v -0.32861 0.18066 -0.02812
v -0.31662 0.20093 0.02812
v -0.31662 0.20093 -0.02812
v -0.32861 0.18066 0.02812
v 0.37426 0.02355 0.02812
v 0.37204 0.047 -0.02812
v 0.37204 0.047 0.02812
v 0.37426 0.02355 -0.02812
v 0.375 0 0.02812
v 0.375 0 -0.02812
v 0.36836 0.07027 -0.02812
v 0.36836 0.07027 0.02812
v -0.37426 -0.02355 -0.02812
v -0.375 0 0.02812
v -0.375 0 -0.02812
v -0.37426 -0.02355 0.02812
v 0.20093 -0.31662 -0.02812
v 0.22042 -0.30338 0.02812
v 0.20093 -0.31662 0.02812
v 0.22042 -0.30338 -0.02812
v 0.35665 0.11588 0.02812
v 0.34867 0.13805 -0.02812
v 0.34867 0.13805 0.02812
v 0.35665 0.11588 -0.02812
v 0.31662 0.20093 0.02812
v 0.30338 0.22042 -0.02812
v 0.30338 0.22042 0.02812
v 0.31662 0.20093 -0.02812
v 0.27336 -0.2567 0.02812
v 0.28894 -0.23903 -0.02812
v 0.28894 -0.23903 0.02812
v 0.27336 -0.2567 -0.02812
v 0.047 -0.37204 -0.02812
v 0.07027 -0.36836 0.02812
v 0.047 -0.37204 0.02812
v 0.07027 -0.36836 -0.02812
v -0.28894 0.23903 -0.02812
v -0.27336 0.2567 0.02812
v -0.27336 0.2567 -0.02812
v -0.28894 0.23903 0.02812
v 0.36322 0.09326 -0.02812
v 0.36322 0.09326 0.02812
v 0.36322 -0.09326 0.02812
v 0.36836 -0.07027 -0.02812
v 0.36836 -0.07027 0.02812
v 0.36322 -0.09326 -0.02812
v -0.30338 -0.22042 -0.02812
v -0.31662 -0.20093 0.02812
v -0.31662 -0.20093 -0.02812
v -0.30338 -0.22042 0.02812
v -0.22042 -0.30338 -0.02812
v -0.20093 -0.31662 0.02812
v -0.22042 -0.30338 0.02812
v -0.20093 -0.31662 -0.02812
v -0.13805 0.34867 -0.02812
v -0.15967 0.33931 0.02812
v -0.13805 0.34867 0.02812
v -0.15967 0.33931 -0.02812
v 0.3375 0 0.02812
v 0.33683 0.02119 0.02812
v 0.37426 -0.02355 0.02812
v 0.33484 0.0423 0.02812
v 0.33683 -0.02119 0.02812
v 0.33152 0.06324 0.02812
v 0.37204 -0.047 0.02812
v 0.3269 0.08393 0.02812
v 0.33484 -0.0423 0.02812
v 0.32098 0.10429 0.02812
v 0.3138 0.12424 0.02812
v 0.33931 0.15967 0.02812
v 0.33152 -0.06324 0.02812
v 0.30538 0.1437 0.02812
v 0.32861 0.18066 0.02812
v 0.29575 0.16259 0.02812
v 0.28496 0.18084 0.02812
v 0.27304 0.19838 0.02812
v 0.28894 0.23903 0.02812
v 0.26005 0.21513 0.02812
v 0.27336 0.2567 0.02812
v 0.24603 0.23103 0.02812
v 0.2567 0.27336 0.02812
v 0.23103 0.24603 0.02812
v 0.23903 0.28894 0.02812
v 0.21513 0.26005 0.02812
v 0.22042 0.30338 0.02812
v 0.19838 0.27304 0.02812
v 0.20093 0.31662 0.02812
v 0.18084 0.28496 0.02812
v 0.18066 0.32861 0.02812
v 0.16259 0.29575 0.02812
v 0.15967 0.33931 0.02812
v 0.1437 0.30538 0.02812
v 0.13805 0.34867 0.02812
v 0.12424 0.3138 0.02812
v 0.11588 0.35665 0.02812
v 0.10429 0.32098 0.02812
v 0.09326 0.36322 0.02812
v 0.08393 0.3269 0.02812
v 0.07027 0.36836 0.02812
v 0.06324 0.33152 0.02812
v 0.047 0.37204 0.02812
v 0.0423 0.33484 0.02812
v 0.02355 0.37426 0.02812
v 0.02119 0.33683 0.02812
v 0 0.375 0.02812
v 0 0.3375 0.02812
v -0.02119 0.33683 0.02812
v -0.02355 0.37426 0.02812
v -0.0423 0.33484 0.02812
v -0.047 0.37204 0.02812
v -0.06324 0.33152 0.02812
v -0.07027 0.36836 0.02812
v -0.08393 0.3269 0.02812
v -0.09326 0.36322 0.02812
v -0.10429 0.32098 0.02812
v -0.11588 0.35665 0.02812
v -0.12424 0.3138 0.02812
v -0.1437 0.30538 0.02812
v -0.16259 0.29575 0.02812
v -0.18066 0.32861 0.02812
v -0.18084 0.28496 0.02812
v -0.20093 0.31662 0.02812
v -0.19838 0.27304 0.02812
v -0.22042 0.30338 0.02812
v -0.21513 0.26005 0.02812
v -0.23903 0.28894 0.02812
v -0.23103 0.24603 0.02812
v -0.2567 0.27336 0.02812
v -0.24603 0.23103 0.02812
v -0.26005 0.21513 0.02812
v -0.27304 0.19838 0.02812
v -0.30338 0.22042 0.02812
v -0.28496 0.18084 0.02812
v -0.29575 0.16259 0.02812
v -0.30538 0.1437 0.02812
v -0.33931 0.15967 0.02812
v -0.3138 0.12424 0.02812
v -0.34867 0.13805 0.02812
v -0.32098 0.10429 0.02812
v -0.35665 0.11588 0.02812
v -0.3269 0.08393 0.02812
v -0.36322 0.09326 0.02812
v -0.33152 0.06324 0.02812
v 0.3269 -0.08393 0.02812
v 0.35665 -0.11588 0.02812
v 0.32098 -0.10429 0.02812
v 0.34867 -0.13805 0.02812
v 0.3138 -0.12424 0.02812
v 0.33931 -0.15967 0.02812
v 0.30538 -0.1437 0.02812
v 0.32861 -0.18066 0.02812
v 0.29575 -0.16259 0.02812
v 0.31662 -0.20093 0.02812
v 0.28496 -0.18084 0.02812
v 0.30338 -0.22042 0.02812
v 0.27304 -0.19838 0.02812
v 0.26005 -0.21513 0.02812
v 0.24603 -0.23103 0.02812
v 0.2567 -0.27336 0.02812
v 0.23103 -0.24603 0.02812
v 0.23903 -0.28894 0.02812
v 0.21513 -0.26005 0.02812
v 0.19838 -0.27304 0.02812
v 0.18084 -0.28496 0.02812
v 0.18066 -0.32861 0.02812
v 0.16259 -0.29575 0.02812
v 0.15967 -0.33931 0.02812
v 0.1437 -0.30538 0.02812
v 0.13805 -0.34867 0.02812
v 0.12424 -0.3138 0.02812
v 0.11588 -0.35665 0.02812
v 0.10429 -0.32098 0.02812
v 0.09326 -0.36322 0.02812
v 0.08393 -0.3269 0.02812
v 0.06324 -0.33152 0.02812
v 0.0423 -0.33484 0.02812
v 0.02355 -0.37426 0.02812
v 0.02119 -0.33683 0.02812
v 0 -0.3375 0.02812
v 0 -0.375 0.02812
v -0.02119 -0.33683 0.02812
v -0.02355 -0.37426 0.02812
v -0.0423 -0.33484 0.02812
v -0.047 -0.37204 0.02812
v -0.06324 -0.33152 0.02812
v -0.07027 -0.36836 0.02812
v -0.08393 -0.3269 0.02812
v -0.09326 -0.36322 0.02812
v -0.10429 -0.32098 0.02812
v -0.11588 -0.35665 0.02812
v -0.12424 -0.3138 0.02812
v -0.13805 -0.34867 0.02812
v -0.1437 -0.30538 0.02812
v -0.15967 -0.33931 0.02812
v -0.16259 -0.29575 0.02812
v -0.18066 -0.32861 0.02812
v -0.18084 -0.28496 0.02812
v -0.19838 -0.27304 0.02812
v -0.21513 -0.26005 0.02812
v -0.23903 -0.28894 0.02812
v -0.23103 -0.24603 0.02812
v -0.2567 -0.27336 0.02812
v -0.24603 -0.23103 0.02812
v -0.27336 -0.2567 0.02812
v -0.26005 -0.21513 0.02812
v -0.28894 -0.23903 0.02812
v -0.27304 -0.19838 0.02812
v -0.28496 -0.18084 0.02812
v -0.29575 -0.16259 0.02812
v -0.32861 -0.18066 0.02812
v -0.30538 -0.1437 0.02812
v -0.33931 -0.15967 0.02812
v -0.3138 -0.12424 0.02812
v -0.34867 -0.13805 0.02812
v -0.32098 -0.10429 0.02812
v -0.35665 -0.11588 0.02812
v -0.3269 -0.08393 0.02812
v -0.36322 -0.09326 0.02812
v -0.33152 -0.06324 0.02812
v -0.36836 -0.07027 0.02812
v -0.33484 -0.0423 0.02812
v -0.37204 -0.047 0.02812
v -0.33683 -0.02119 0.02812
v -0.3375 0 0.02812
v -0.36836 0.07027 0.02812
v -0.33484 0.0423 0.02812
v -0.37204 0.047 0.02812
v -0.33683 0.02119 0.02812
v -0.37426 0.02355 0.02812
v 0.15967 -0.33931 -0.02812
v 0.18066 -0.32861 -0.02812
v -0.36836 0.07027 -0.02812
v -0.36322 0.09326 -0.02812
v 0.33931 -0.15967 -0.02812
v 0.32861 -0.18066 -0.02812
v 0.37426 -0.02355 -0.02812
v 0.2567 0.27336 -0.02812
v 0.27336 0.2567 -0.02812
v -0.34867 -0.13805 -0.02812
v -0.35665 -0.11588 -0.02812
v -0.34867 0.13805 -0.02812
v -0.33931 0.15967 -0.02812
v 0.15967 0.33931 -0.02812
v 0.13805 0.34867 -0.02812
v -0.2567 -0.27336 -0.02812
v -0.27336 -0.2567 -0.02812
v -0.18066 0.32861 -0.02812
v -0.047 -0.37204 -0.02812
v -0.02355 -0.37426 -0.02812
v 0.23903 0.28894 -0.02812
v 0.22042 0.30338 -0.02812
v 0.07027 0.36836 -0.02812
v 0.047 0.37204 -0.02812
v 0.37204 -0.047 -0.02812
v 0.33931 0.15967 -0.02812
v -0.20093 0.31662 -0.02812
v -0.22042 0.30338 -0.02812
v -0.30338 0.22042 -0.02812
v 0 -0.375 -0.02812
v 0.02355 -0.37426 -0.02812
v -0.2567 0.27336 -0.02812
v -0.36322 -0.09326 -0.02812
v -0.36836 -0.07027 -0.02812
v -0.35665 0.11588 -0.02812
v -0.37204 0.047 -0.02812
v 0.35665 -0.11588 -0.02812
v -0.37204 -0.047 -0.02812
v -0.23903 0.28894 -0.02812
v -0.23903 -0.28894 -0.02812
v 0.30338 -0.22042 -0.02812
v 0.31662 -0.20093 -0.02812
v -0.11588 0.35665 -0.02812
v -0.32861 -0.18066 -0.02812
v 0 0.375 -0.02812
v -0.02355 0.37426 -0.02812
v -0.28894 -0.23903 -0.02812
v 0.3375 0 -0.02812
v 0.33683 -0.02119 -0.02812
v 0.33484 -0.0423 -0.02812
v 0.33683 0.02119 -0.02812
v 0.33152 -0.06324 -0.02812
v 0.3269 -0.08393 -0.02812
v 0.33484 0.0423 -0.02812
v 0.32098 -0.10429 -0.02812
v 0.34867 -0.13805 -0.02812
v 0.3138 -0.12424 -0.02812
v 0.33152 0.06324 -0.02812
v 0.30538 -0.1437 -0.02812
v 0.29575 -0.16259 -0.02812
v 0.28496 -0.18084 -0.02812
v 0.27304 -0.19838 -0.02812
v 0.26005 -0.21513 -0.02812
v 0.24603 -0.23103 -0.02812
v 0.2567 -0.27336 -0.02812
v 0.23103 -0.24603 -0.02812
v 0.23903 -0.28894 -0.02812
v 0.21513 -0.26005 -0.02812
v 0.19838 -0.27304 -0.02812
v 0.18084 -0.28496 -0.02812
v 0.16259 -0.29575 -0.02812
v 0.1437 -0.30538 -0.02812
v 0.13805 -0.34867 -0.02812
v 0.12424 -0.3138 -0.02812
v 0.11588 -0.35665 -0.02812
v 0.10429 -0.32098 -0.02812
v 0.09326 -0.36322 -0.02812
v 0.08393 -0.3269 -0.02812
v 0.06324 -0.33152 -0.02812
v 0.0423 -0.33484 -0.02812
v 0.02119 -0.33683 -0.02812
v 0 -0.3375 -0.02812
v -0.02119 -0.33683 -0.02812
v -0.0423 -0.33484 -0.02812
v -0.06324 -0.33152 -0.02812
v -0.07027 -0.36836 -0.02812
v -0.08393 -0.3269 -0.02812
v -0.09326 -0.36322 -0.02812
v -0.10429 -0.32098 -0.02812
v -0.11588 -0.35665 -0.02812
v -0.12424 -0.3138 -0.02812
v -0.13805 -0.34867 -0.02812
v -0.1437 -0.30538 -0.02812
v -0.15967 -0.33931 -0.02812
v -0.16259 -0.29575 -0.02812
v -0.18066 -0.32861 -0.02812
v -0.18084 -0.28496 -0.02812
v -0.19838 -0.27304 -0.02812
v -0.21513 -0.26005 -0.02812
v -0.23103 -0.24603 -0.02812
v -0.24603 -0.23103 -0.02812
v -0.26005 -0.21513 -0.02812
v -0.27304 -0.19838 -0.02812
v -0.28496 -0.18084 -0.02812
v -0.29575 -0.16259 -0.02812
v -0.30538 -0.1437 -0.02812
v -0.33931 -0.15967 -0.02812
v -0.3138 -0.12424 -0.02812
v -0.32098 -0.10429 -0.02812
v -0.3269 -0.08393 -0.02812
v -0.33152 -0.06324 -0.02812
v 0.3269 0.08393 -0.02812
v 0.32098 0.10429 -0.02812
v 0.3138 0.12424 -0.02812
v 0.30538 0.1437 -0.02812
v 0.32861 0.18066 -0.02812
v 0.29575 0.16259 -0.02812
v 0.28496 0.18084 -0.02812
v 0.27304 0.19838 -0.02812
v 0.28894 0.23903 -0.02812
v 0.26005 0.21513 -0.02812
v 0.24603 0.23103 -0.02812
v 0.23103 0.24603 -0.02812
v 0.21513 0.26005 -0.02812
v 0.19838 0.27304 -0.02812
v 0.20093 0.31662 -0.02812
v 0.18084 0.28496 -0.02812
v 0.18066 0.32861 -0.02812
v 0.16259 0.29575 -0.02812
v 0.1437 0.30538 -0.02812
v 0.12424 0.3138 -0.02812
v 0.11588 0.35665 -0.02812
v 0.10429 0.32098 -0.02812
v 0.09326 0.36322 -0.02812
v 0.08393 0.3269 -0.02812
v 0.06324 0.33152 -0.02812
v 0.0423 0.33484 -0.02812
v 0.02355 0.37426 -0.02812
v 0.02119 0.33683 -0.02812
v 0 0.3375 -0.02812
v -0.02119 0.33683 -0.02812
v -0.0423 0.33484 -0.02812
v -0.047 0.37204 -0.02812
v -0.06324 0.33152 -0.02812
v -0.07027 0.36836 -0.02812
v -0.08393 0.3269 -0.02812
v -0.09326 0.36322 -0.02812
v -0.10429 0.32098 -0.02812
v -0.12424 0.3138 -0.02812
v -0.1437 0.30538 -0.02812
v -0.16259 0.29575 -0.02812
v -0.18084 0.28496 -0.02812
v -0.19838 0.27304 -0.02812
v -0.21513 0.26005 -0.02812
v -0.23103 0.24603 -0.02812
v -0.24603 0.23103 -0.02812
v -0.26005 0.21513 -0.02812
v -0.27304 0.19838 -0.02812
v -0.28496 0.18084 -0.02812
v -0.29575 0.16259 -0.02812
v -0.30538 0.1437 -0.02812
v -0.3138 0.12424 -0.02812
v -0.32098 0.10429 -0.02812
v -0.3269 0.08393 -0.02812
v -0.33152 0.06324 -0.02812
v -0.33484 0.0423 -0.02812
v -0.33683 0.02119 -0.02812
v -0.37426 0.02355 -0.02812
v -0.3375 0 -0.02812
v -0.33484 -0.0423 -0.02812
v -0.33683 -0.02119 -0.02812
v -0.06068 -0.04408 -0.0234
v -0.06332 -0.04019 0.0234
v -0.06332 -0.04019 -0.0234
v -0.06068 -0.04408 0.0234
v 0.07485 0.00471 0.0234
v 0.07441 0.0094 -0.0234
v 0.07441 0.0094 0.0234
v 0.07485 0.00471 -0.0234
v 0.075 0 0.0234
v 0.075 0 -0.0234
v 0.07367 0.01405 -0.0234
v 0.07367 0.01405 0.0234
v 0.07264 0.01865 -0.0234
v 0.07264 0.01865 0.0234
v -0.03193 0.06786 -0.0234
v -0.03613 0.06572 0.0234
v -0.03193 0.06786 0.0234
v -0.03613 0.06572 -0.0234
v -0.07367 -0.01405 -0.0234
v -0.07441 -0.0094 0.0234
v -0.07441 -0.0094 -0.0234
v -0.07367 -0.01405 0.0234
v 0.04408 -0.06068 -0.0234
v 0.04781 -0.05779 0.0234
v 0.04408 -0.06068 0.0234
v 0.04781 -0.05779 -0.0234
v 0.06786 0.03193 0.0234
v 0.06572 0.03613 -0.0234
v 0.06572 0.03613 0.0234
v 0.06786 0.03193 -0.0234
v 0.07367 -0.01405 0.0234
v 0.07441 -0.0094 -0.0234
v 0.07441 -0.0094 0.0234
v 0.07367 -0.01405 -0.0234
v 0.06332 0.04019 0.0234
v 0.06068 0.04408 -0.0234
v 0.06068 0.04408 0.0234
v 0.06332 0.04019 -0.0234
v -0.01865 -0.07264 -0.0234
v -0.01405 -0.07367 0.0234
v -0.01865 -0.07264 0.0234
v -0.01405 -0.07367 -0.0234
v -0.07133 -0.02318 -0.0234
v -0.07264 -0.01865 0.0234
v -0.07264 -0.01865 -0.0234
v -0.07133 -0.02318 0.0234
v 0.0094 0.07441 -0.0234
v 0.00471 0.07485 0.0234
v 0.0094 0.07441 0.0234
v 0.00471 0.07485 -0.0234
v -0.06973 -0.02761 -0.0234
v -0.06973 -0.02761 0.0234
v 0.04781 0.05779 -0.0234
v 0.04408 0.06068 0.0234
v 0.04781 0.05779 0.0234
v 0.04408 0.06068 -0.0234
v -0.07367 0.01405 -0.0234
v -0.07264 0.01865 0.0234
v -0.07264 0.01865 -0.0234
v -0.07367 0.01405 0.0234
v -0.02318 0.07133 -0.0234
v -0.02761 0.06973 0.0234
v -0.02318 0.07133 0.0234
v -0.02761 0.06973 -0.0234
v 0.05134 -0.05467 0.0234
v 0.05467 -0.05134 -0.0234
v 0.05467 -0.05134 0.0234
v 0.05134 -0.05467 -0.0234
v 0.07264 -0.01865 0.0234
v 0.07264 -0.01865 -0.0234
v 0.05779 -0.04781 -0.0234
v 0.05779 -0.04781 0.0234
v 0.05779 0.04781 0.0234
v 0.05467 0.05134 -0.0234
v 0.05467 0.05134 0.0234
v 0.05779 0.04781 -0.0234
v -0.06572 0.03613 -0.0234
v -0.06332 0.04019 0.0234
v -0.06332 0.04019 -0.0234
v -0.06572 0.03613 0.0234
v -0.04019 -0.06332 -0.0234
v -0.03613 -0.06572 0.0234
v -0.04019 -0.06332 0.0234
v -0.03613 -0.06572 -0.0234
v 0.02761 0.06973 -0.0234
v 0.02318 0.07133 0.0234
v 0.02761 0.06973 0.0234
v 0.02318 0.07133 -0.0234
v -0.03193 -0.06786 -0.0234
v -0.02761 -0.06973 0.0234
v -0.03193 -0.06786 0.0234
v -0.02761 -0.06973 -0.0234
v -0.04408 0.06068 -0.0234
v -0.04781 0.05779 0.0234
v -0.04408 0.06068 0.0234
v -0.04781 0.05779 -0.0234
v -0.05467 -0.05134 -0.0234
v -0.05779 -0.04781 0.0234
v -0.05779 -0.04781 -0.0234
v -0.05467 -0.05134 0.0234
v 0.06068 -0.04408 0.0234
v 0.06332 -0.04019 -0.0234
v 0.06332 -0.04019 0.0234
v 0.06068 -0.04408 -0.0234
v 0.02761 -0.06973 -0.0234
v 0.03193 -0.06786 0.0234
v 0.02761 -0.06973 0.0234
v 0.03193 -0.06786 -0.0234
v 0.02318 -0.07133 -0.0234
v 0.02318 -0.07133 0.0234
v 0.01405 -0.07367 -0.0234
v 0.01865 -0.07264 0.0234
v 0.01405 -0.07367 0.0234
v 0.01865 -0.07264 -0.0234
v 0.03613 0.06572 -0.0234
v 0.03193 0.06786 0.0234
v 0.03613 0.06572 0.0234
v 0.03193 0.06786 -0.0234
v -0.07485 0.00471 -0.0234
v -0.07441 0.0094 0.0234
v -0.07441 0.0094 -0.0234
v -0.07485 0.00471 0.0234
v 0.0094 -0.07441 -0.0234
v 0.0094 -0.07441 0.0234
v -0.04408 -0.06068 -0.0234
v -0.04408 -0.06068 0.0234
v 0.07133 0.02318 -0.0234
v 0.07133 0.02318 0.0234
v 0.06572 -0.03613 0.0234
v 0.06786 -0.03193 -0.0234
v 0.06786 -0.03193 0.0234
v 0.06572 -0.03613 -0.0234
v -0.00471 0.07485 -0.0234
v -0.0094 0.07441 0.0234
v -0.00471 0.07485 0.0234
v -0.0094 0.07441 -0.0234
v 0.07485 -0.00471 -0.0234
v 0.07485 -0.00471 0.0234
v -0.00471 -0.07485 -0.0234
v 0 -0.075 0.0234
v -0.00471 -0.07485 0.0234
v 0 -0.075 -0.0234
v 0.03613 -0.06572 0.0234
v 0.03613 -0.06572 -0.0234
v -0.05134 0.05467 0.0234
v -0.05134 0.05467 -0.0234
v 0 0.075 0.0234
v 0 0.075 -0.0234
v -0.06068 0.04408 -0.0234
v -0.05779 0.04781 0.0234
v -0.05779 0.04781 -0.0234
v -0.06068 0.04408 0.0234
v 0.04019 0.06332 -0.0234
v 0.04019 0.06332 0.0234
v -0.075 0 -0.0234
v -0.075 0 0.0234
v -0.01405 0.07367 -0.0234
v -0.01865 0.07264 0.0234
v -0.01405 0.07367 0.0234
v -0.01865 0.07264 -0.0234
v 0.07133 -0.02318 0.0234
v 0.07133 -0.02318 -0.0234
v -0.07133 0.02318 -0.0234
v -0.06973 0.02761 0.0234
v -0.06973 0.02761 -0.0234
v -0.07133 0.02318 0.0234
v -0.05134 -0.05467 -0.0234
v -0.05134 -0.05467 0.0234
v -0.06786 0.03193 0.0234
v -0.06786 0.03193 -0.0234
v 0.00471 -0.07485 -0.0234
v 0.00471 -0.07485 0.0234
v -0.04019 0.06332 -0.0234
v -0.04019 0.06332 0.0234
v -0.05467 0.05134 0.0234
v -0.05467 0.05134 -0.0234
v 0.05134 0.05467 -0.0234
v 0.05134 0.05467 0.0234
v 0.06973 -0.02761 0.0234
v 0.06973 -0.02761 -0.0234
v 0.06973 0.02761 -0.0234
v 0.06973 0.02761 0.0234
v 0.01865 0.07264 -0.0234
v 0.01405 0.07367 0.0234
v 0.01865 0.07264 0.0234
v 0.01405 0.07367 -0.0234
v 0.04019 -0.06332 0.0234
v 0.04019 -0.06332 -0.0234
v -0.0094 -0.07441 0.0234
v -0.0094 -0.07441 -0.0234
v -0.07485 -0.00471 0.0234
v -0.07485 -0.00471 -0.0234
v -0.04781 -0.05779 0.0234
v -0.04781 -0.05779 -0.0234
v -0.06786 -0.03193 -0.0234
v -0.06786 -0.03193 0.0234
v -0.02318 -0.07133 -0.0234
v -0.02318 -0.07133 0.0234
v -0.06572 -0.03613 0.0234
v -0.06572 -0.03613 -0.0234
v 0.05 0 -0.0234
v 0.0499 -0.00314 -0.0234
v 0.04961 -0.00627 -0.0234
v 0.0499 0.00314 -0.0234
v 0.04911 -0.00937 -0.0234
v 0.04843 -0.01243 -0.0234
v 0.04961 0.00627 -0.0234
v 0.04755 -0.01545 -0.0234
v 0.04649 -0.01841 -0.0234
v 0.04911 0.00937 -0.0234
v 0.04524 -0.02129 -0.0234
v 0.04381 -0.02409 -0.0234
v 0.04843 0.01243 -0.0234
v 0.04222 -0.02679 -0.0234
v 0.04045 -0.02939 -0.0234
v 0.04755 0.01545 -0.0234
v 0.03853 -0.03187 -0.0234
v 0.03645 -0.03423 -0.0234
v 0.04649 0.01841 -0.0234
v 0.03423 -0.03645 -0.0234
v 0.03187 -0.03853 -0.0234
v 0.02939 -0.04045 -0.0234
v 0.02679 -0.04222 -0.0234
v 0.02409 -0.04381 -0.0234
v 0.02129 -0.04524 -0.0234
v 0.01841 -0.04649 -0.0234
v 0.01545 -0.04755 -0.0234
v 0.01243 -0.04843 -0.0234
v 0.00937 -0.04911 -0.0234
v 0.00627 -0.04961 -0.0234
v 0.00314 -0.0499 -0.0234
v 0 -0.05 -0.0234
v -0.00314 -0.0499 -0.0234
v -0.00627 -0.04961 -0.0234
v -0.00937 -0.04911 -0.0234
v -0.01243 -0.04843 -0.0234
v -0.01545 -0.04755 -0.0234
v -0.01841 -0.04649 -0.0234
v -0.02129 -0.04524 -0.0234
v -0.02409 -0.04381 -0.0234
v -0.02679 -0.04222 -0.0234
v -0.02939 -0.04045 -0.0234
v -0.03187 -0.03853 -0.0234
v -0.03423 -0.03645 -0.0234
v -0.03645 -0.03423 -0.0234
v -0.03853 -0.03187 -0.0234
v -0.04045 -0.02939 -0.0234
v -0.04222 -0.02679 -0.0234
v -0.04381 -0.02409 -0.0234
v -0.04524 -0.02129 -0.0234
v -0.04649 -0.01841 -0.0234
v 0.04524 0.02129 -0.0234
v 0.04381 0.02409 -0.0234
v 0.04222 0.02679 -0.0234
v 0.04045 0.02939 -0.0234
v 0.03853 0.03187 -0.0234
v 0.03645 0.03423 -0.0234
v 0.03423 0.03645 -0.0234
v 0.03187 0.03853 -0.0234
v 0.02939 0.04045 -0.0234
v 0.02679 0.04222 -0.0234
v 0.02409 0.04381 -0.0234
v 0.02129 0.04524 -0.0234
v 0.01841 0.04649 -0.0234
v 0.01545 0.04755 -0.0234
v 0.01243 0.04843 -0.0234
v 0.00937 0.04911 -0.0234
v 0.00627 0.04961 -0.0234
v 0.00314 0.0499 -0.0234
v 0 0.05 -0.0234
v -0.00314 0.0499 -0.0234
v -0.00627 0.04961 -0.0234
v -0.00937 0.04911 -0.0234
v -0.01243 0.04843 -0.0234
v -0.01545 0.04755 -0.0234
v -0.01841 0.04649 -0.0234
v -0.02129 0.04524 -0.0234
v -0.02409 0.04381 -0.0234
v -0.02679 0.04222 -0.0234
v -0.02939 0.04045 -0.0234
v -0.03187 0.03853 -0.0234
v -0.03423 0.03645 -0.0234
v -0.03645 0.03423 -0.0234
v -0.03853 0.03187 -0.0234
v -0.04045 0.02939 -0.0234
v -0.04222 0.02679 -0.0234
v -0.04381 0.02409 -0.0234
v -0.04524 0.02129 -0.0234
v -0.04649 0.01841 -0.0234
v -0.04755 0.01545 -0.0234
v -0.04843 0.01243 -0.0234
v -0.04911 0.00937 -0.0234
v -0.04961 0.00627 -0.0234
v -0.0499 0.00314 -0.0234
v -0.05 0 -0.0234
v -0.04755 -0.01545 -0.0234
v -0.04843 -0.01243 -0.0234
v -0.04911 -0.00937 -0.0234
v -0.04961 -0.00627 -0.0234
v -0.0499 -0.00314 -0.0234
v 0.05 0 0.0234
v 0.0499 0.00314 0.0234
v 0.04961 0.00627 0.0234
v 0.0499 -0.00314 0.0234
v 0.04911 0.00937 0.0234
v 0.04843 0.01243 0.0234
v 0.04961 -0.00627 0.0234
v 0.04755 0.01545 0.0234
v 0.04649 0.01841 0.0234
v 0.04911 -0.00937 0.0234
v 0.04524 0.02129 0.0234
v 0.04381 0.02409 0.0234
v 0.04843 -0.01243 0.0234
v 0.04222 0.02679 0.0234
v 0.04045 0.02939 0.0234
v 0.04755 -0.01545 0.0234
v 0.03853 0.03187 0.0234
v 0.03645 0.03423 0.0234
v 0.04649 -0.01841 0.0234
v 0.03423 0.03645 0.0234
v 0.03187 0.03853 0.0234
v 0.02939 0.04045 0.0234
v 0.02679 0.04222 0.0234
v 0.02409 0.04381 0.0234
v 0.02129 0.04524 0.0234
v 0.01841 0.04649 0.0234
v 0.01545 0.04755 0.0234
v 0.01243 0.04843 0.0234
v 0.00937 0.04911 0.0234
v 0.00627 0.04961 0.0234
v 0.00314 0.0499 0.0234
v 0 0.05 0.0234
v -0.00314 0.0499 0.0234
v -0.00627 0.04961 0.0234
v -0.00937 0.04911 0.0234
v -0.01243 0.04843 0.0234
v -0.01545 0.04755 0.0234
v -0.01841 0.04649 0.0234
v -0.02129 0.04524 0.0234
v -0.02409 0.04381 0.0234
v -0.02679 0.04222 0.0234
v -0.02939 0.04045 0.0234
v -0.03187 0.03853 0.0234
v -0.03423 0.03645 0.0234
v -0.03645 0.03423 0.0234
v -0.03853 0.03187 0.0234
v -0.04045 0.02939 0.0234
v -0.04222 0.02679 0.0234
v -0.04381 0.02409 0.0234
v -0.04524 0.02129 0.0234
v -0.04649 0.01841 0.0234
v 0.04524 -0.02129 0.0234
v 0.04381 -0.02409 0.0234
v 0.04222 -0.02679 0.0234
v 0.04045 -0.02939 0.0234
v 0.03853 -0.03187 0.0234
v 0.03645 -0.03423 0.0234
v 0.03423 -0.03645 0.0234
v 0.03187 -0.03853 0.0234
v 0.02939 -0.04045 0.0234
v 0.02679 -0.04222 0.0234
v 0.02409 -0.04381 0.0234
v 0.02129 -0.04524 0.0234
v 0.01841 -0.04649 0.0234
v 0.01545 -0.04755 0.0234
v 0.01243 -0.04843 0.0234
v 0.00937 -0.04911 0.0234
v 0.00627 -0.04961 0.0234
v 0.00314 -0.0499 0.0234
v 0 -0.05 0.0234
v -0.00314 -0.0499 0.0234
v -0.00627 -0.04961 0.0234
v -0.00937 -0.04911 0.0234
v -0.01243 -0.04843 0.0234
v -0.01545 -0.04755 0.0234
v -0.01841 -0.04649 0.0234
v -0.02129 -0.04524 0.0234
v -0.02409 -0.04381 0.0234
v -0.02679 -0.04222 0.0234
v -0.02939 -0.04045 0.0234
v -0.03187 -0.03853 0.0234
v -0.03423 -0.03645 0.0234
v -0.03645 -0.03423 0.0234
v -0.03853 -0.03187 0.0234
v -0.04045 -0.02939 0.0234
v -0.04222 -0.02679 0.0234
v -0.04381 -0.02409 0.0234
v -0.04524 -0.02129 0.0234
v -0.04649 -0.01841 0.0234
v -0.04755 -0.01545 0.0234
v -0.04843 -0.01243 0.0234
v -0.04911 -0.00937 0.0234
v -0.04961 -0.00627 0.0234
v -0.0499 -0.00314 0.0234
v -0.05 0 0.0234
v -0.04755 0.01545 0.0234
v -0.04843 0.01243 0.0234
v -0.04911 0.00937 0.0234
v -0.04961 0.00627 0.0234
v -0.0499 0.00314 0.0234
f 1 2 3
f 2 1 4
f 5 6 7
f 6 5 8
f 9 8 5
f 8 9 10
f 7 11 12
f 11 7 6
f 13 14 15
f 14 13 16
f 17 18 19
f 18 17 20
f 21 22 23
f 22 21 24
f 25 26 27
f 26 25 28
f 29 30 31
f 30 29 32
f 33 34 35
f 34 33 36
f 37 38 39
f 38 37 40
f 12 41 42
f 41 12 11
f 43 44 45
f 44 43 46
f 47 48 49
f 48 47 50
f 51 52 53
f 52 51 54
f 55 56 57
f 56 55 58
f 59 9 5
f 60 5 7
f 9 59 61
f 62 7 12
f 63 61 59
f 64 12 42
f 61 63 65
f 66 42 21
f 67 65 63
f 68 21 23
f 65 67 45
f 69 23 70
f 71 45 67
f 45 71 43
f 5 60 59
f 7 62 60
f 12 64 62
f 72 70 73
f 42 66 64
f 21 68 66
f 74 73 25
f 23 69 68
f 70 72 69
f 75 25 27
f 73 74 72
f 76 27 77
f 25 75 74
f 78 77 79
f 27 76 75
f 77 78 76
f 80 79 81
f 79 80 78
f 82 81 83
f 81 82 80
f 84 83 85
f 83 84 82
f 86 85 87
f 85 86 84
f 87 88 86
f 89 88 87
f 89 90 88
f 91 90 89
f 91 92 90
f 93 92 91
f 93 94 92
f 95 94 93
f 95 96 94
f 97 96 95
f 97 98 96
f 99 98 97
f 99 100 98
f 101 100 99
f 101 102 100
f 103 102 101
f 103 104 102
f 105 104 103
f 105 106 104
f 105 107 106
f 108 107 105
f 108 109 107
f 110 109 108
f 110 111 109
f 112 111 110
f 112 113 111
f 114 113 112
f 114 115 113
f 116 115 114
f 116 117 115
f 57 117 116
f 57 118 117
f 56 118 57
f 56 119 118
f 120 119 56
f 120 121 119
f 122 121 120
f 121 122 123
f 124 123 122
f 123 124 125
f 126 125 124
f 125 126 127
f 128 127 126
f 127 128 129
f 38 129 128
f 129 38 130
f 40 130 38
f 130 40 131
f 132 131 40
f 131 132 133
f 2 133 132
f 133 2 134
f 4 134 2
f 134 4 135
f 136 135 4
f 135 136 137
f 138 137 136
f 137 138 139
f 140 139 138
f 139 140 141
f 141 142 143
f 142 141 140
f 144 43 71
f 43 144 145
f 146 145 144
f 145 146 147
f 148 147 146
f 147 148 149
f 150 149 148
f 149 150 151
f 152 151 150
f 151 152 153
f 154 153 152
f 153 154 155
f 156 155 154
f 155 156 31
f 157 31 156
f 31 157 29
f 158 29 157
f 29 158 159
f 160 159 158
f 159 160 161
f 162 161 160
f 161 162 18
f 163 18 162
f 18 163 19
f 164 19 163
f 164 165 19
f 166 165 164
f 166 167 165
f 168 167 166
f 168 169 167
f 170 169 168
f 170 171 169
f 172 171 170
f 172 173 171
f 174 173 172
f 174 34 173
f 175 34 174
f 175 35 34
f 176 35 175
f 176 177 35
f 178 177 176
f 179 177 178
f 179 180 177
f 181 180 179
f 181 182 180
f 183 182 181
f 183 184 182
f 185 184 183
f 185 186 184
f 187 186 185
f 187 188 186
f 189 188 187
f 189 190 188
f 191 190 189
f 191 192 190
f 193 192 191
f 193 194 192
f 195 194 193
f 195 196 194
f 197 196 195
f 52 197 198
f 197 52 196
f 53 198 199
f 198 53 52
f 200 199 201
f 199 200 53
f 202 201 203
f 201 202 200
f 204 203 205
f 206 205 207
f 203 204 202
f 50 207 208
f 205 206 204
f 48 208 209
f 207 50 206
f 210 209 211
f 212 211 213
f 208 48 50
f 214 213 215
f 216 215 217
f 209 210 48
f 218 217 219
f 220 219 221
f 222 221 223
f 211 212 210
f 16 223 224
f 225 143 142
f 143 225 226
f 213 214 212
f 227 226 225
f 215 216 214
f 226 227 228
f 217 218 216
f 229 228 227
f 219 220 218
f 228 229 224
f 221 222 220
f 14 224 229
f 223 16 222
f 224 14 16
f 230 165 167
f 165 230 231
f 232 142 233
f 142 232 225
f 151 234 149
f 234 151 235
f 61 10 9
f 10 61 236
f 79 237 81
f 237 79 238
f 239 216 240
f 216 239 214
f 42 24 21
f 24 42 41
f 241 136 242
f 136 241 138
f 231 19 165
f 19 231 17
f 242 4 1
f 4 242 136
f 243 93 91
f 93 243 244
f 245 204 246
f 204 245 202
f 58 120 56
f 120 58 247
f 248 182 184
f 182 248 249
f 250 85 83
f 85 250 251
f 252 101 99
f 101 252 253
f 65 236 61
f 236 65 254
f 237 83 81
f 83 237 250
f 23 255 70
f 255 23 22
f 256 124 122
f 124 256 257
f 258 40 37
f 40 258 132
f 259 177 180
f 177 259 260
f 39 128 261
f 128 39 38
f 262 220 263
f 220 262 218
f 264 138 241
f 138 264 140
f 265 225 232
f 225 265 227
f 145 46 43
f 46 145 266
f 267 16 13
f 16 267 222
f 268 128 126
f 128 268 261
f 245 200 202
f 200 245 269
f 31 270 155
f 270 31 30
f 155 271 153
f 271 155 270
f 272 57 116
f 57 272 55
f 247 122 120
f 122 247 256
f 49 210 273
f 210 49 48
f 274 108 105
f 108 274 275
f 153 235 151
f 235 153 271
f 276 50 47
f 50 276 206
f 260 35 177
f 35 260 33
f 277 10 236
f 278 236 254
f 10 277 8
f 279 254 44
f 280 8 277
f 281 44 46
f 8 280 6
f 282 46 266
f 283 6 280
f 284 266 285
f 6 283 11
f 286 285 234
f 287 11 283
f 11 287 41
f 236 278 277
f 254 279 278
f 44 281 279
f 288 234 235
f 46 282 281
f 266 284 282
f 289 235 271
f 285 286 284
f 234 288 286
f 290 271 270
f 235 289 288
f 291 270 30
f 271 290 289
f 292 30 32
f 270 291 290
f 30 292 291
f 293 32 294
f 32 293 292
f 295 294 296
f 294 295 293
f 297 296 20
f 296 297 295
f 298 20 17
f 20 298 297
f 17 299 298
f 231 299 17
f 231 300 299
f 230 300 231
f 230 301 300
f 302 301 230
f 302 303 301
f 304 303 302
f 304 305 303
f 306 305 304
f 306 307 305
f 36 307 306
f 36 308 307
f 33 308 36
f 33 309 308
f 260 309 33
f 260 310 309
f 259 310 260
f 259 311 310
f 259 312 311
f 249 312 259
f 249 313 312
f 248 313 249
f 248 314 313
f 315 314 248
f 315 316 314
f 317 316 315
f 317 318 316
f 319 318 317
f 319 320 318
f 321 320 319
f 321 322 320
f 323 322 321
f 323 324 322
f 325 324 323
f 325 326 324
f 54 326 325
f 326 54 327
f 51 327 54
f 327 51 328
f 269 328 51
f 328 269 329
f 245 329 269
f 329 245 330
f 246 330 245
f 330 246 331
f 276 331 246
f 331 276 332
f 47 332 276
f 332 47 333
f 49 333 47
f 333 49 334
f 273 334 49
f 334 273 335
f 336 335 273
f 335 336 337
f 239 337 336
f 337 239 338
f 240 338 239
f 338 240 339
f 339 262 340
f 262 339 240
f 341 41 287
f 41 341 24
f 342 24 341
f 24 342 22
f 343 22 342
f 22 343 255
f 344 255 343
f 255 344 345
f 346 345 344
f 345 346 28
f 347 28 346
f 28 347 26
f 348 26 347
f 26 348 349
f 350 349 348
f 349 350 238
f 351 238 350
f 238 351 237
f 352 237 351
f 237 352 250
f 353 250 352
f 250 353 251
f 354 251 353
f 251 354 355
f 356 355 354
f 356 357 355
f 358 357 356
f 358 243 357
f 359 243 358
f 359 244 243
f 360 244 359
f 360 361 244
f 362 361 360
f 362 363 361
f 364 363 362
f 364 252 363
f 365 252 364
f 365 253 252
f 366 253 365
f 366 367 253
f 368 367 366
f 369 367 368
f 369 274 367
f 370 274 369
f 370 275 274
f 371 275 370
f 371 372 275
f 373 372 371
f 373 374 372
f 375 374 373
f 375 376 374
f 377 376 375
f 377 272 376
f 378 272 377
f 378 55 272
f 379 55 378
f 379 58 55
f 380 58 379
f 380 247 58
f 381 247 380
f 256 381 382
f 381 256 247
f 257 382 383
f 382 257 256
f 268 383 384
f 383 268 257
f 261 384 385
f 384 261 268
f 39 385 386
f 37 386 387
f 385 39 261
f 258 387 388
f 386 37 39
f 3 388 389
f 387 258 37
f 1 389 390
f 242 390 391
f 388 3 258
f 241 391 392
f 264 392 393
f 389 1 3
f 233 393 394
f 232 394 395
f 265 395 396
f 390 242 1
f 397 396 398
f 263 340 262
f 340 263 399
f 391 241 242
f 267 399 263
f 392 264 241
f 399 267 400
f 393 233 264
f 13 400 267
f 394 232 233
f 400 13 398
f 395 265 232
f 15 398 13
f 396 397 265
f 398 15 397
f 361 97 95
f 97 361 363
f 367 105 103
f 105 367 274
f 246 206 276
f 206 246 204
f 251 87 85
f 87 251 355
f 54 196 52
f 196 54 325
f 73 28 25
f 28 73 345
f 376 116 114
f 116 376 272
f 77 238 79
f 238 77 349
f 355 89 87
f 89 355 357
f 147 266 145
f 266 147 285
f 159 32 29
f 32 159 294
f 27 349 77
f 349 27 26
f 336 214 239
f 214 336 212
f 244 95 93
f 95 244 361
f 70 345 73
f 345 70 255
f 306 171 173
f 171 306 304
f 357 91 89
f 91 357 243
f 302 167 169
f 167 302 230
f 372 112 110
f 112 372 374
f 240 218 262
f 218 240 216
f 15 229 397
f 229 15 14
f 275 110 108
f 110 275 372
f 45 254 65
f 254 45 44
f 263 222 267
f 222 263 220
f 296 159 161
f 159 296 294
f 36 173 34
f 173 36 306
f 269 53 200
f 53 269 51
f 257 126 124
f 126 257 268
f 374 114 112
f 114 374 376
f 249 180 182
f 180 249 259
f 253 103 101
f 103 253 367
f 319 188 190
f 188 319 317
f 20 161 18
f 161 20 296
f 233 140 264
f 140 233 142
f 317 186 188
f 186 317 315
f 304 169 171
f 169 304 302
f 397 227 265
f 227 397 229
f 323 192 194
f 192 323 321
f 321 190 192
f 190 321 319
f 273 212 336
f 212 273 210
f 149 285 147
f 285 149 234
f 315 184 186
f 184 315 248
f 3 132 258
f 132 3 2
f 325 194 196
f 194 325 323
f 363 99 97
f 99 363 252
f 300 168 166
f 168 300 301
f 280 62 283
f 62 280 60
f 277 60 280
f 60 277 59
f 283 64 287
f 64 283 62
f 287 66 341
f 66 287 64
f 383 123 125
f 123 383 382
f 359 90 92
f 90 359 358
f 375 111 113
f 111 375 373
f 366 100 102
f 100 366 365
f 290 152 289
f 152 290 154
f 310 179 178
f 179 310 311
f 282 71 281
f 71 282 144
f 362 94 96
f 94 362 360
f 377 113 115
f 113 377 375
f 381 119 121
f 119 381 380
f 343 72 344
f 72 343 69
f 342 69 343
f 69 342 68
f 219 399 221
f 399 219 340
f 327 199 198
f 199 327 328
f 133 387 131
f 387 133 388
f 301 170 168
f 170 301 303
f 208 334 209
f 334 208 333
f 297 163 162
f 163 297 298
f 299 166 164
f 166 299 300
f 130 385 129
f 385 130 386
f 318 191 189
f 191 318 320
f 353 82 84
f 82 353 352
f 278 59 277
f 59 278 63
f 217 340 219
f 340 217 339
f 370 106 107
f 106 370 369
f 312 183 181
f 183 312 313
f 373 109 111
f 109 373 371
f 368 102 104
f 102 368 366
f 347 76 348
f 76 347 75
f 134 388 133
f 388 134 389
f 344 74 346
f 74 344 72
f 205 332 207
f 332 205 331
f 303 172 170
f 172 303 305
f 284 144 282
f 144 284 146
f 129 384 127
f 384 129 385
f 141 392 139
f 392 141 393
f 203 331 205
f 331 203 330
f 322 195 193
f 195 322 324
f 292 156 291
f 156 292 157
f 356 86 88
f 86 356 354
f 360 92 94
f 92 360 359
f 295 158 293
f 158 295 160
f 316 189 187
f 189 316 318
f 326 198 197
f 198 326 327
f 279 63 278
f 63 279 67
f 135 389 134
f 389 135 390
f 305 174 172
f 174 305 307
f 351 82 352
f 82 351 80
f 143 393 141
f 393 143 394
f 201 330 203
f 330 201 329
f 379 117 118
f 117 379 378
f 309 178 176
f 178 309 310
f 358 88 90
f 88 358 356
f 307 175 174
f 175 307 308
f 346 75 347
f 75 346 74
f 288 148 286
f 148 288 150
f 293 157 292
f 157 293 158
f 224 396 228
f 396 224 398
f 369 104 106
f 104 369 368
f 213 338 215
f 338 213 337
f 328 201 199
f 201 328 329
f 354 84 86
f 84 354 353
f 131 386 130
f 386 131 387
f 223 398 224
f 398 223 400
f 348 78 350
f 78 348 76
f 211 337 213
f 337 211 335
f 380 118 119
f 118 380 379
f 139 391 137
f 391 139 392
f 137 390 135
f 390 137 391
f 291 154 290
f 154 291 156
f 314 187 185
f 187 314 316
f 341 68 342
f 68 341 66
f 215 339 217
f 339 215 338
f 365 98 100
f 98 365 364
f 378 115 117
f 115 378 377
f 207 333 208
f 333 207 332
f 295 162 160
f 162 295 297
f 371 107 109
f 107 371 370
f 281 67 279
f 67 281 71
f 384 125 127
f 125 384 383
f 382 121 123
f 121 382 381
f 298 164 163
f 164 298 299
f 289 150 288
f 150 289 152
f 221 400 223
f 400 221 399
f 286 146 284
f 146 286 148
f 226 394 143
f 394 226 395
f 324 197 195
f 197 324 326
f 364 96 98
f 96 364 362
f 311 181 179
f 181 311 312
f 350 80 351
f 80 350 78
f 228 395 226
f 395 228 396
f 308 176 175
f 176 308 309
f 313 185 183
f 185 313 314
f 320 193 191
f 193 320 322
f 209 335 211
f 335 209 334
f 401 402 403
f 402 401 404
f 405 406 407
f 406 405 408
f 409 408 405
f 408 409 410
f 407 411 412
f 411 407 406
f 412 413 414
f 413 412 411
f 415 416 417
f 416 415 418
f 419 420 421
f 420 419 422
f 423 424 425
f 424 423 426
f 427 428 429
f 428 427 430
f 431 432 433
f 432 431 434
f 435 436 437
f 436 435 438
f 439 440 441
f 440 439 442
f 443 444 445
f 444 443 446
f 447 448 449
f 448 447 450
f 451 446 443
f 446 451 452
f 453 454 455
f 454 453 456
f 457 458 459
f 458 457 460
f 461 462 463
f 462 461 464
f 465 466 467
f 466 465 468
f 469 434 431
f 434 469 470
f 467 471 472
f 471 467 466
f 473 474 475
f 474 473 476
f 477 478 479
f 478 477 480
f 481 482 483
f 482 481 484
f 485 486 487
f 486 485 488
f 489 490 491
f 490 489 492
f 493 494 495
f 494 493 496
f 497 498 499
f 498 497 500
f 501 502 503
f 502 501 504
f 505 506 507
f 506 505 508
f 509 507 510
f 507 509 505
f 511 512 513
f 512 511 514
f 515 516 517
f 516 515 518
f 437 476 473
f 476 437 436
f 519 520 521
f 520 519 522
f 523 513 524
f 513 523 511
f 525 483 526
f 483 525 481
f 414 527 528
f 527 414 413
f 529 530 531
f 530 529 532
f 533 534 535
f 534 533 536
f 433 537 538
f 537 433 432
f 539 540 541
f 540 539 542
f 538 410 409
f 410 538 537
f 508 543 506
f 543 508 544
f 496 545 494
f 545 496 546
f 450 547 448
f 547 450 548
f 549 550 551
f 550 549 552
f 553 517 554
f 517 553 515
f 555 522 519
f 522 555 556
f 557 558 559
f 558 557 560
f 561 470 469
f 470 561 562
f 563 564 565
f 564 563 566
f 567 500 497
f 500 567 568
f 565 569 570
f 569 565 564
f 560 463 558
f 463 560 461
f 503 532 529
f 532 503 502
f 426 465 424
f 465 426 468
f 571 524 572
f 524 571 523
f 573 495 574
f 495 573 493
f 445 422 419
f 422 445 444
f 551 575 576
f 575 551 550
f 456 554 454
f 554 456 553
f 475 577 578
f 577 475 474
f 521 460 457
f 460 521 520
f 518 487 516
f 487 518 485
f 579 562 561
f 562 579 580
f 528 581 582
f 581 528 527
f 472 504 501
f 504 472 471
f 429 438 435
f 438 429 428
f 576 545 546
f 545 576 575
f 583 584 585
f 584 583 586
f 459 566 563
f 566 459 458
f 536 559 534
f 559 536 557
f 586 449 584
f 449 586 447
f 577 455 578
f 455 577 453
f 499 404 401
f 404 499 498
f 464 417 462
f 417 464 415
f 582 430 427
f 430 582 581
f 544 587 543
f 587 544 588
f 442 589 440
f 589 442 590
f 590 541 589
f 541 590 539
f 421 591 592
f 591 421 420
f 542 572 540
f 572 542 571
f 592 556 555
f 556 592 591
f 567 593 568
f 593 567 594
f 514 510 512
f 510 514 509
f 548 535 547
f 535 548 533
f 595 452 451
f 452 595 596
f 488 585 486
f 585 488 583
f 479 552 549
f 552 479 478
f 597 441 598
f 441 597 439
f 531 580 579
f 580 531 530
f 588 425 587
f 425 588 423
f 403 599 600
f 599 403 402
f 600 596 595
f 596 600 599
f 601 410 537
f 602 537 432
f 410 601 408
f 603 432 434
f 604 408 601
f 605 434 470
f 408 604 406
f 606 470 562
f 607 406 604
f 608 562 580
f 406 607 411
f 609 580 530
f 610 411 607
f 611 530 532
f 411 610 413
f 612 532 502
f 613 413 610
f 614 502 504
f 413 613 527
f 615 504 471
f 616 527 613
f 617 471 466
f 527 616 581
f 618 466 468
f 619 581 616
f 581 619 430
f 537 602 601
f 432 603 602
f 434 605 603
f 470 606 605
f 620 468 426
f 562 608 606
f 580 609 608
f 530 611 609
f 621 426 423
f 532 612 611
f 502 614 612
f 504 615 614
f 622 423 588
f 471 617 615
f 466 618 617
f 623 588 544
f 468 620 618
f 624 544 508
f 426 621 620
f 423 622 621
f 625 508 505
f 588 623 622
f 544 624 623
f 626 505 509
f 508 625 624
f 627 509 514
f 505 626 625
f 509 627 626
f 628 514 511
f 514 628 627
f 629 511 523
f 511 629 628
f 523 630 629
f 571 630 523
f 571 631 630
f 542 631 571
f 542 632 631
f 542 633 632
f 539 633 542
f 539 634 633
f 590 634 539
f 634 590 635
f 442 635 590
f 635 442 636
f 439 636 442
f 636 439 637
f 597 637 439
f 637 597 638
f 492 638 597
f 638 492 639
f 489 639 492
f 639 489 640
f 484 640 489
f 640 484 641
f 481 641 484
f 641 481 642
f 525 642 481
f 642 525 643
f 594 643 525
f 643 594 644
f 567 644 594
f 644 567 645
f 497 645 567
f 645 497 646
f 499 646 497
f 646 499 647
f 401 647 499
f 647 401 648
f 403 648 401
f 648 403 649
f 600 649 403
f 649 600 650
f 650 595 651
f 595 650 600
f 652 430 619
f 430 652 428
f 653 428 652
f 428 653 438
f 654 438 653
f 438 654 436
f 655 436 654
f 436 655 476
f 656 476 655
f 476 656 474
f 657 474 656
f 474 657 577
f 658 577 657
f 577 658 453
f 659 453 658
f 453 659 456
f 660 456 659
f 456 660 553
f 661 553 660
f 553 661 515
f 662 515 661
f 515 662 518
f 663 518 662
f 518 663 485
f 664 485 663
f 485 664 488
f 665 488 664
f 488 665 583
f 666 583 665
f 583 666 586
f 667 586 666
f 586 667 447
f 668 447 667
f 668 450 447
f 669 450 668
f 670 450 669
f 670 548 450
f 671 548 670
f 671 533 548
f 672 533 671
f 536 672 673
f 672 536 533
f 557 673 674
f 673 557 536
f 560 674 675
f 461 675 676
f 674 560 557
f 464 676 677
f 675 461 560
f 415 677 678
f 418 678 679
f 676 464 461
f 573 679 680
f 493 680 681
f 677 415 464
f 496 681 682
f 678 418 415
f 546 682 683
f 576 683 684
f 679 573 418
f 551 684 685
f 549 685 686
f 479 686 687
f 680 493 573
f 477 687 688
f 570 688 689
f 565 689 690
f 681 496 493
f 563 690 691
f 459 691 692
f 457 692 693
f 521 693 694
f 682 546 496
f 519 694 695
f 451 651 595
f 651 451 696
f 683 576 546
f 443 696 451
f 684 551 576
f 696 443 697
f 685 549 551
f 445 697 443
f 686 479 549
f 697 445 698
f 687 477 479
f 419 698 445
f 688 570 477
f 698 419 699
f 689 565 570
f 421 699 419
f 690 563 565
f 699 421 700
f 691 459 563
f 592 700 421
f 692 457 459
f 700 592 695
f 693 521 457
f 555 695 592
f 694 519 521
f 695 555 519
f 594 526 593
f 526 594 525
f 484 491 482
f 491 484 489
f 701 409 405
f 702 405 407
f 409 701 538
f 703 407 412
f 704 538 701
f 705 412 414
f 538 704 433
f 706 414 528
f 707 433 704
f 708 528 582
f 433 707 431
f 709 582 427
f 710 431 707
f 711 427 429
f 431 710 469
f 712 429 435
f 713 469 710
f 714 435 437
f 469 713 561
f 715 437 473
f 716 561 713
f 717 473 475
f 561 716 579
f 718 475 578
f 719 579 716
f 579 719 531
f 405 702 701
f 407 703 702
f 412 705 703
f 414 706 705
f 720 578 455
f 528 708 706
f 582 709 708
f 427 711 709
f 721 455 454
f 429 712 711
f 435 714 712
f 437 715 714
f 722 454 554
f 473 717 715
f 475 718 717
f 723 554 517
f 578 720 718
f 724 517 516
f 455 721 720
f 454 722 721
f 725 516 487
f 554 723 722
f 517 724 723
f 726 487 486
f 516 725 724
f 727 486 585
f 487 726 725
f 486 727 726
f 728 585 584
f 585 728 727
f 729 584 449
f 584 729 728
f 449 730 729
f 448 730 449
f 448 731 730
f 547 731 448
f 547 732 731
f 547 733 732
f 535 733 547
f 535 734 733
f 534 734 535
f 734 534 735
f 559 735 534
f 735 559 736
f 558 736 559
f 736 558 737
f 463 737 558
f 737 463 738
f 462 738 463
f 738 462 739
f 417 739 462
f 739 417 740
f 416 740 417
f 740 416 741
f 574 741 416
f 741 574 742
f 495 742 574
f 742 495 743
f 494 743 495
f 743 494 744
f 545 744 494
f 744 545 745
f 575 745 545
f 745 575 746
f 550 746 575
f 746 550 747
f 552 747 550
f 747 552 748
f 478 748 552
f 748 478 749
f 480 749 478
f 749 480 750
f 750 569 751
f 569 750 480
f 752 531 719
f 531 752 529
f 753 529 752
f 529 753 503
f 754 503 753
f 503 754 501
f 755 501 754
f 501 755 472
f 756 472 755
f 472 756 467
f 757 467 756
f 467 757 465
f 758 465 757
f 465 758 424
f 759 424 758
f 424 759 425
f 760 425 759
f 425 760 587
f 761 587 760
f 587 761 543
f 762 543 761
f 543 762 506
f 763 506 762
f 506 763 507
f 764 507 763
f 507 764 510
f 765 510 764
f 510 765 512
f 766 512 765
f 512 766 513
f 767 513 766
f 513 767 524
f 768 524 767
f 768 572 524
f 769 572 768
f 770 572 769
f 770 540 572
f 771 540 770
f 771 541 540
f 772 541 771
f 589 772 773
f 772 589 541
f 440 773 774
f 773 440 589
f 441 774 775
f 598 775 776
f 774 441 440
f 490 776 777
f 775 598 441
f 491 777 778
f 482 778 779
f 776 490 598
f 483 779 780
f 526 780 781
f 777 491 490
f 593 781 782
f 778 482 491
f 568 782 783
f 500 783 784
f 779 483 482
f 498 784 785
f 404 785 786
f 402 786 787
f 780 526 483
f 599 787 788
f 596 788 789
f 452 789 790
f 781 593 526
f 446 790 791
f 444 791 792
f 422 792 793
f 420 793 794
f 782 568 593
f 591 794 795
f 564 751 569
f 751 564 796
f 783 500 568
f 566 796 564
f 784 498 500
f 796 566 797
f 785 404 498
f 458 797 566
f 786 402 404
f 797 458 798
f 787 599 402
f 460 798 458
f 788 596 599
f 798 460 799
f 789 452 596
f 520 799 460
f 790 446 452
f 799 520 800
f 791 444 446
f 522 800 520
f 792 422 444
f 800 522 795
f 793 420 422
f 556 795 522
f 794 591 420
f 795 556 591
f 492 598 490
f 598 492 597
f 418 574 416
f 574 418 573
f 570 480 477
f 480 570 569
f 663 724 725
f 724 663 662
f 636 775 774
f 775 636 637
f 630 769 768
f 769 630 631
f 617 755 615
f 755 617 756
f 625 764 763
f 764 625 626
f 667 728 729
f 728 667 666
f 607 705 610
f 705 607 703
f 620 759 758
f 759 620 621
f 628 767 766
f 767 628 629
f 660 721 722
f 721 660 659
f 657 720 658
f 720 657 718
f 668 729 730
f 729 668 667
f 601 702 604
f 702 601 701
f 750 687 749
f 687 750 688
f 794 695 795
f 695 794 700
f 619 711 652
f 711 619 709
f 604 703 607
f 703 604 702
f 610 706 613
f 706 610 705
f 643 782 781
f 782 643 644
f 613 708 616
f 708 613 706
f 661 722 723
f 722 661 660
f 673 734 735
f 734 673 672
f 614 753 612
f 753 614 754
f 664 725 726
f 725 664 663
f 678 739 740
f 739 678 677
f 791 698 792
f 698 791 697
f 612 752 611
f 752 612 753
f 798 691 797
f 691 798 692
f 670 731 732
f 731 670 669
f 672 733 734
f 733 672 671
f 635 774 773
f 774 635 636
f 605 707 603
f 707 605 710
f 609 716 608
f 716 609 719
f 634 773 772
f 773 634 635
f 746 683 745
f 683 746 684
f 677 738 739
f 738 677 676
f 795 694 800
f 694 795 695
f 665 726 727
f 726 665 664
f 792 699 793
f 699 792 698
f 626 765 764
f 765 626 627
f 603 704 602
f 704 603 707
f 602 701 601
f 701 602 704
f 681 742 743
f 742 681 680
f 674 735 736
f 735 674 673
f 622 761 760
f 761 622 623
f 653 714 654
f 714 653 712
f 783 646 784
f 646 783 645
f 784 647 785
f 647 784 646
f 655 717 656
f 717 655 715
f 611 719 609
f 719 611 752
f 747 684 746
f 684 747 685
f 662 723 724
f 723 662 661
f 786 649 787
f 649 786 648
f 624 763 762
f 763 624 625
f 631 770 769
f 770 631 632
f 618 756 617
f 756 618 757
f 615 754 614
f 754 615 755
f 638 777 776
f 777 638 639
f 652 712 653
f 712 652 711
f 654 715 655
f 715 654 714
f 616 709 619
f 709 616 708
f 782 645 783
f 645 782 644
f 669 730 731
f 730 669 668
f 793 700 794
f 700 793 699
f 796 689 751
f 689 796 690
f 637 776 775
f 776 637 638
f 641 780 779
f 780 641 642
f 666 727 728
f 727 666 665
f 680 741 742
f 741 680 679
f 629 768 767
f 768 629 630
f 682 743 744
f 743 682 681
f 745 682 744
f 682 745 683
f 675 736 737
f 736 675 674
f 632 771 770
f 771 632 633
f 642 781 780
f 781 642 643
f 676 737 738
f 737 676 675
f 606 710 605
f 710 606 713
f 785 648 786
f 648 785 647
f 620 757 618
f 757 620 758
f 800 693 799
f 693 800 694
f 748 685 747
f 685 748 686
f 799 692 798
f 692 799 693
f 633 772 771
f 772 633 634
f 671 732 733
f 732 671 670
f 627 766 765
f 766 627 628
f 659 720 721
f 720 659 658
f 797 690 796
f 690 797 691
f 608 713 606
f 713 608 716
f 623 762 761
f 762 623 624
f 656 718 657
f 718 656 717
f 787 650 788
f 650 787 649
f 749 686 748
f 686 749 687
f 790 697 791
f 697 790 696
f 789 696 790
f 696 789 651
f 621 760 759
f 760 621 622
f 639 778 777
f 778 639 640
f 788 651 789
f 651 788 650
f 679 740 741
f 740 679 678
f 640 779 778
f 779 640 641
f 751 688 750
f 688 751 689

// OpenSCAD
// Main parameter dimensions (all in mm)
outer_radius_base    = 0.375;   // outer radius of the annular base
inner_radius_base    = 0.3375;  // inner radius of the annular base (large central opening)
height_base          = 0.05625; // total thickness, centered on the underside reference plane

collar_outer_radius  = 0.075;   // outer radius of the solid annular collar (0.15 x 0.15 footprint)
collar_inner_radius  = 0.05;    // inner void radius of the collar (assumed, keeps the collar as a true through void)
collar_height        = 0.0468;  // height of the collar (spans from -0.0234 to +0.0234)

web_inner_radius     = collar_outer_radius;  // web attaches to collar
web_outer_radius     = inner_radius_base;    // web reaches the inner wall of the base annulus
web_height           = 0.028125;             // from -0.0141 to +0.0141

// Bounding rectangle for the rib web (offset within the 0.75 x 0.75 footprint)
rect_width           = 0.6184;   // full width
rect_height          = 0.521;    // full height
rect_center_y_offset = -0.0758;  // shift from the global center (0.375,0.375) to (0.375,0.2992)

// Radial slot parameters for the rib web
slot_count           = 8;
slot_width           = 0.04;      // tangential width of each elongated slot
slot_length          = web_outer_radius - web_inner_radius;

$fn = 100;  // smooth circular profiles

// ----------------------------------------------------------------------
// Utility module: annular ring (difference of two cylinders)
// ----------------------------------------------------------------------
module annular_ring(outer_r, inner_r, h) {
    difference() {
        cylinder(h = h, r = outer_r, center = true);
        cylinder(h = h + 0.001, r = inner_r, center = true); // slightly longer to ensure clean subtraction
    }
}

// ----------------------------------------------------------------------
// 2D shape of one radial slot (rectangle oriented radially)
// ----------------------------------------------------------------------
module radial_slot(length, width, angle) {
    // Position the rectangle so that its inner end lies on web_inner_radius
    translate([web_inner_radius + length / 2, 0])
        rotate(angle)
            square([length, width], center = true);
}

// ----------------------------------------------------------------------
// 2D projection of the rib web: annular ring clipped to the bounding rectangle
// ----------------------------------------------------------------------
module web_2d() {
    intersection() {
        // Full ring between web_inner_radius and web_outer_radius
        difference() {
            circle(r = web_outer_radius);
            circle(r = web_inner_radius);
        }
        // Clip to the rectangular region
        translate([0, rect_center_y_offset])
            square([rect_width, rect_height], center = true);
    }
}

// ======================================================================
// Main assembly: union of base annulus, central collar, and rib web
// ======================================================================
union() {
    // 1. Base annular plate (outer ring with large central hole)
    annular_ring(outer_radius_base, inner_radius_base, height_base);
    
    // 2. Solid annular collar (small, centered, with a through void)
    annular_ring(collar_outer_radius, collar_inner_radius, collar_height);
    
    // 3. Rib web (solid radial ribs with arc-based outlines and elongated slots)
    linear_extrude(height = web_height, center = true)
        difference() {
            // Base web shape (annular sector inside the rectangle)
            web_2d();
            // Subtract radial slots to leave solid ribs
            for (i = [0 : slot_count - 1]) {
                angle = i * 360 / slot_count;
                radial_slot(slot_length, slot_width, angle);
            }
        }
}
